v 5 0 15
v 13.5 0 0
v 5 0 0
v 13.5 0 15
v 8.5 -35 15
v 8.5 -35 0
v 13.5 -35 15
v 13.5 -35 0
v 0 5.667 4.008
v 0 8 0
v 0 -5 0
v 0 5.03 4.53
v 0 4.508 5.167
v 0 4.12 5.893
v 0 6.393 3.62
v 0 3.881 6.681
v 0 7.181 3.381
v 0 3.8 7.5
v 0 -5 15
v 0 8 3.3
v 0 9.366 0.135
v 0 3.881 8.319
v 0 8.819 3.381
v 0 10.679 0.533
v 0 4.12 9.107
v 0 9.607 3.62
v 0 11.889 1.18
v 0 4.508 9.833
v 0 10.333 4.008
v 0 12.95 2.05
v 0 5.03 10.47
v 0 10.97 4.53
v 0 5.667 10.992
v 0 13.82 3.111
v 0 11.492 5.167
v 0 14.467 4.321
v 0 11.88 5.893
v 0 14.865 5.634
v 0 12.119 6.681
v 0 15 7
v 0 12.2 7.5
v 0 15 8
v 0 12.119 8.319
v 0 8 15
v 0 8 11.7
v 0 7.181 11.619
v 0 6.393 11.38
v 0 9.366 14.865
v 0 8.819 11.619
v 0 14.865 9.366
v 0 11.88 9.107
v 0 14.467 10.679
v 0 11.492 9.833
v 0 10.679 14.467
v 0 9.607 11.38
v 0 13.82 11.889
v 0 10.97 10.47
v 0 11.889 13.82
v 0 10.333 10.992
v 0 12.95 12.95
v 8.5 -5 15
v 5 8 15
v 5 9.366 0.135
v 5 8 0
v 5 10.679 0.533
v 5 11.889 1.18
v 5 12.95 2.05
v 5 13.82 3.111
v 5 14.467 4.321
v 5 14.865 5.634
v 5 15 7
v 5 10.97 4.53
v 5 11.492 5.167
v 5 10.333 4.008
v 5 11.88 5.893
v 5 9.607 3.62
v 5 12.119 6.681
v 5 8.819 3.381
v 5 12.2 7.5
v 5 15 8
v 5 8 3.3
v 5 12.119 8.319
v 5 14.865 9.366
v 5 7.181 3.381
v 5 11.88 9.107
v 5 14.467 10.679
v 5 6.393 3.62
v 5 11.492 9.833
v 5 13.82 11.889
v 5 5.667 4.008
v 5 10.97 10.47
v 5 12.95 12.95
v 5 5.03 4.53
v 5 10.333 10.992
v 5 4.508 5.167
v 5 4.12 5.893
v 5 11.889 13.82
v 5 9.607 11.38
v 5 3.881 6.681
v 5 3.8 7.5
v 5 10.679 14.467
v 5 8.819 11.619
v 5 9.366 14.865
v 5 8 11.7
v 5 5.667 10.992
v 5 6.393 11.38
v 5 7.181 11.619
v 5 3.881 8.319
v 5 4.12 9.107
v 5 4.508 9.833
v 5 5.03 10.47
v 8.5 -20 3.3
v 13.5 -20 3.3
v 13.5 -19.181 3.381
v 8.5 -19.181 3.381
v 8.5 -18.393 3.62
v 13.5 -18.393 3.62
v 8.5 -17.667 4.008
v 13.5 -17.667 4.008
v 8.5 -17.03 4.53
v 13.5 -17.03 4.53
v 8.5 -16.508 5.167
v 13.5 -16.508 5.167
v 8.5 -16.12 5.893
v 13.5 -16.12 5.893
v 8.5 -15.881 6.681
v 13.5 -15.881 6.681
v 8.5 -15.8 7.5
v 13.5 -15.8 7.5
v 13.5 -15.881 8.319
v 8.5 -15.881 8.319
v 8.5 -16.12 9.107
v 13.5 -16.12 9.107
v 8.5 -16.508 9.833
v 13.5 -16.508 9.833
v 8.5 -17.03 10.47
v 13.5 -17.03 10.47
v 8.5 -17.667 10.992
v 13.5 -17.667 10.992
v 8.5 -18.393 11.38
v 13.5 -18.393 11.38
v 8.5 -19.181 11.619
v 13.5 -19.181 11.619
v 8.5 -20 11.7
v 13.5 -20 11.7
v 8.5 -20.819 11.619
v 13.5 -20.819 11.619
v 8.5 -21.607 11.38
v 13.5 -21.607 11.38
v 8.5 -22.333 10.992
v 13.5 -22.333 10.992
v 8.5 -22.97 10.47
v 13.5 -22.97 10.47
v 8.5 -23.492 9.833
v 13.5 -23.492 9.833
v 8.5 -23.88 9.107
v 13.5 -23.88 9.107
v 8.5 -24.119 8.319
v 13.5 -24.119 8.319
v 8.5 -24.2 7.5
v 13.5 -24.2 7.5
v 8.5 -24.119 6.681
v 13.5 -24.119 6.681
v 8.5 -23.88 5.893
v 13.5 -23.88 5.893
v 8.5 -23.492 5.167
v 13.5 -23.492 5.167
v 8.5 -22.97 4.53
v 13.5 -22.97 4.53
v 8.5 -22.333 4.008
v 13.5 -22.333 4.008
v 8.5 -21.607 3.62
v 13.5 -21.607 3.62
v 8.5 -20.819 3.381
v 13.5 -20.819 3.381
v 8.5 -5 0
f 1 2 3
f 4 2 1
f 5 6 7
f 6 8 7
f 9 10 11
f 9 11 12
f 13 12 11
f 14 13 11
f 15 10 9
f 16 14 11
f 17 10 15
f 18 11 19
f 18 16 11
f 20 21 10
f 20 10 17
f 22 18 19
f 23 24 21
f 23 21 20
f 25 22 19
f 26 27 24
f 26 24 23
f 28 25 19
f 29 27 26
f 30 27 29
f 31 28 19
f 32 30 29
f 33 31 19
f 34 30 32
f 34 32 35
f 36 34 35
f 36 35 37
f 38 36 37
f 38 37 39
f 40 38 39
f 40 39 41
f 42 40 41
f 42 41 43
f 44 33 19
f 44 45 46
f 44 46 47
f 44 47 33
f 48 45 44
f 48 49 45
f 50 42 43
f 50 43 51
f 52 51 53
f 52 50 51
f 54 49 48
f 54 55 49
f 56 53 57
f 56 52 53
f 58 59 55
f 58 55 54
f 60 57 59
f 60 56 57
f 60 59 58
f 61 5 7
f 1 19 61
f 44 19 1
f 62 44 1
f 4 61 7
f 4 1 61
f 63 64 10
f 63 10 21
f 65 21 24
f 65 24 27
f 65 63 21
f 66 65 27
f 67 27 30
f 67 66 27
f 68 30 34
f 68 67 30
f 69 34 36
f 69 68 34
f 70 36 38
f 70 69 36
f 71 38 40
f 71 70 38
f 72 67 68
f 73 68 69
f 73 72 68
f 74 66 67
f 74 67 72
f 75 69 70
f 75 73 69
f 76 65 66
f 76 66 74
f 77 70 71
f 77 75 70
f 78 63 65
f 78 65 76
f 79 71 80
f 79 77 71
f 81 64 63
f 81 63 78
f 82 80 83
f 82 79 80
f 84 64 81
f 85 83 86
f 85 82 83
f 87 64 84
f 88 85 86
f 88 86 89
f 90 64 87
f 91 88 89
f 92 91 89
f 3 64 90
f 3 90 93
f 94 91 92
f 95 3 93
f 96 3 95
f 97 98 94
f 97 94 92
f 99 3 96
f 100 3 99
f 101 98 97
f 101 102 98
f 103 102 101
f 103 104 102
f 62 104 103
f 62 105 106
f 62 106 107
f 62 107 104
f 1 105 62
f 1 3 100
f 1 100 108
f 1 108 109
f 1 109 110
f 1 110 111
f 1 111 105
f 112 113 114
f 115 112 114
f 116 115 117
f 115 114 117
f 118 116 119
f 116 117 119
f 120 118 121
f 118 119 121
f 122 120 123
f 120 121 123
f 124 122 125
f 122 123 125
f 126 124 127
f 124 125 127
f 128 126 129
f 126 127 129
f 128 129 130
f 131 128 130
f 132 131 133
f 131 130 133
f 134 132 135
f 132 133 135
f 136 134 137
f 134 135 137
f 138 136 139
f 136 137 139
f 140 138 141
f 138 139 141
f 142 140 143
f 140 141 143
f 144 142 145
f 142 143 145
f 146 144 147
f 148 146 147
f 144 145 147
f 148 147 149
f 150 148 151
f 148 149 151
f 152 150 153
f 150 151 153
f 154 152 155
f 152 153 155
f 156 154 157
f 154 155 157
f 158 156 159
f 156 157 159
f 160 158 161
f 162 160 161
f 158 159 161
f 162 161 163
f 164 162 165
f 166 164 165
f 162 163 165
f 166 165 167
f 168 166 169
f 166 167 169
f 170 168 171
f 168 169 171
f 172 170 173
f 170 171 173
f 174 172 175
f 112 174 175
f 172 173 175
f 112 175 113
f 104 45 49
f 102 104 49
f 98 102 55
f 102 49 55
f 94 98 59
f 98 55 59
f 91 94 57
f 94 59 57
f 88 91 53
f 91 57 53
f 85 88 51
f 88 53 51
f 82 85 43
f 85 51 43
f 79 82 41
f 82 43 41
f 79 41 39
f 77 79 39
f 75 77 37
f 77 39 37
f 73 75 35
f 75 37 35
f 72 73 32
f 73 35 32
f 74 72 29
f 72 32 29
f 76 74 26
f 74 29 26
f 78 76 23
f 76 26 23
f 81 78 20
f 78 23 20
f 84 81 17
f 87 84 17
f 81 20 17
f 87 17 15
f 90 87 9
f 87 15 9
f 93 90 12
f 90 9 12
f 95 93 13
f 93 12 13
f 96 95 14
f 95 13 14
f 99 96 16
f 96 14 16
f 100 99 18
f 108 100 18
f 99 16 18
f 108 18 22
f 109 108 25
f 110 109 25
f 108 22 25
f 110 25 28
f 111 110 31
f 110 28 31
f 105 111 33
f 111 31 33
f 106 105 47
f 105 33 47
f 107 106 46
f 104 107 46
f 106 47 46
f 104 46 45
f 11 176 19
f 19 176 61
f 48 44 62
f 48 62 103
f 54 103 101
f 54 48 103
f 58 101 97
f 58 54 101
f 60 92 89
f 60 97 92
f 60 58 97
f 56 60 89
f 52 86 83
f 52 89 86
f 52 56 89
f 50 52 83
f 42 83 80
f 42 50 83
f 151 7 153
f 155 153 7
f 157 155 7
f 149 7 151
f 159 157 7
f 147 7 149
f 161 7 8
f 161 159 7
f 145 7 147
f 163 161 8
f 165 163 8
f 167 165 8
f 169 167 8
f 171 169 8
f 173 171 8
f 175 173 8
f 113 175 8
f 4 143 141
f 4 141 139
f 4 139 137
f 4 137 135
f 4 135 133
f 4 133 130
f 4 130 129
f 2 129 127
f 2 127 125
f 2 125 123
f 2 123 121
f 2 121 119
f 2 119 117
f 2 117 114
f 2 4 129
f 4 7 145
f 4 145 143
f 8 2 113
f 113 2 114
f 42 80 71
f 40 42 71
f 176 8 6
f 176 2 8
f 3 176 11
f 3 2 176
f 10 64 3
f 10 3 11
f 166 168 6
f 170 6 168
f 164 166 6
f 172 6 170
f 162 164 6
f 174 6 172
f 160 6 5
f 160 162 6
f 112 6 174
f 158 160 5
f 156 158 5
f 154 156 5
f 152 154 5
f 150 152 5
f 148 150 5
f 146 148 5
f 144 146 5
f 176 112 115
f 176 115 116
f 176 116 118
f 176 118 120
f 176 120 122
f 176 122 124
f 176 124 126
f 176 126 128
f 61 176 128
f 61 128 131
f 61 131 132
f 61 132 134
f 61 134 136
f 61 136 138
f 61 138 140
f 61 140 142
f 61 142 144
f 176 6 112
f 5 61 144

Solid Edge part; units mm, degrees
sketch "Sketch1" plane through (0, 0, 0) normal (0, -1, 0) x (1, 0, 0)
  line L0 (13.5, 0) -> (0, 0)
  line L1 (0, 0) -> (0, 15)
  line L2 (0, 15) -> (13.5, 15)
  line L3 (13.5, 15) -> (13.5, 0)
extrude "Protrusion1" add sketch "Sketch1" along normal blind 5
sketch "Sketch2" plane through (18.75, -5, 7.5) normal (0, -1, 0) x (1, 0, 0)
  line L0 (-10.25, -7.5) -> (-10.25, 7.5)
  line L1 (-10.25, 7.5) -> (-5.25, 7.5)
  line L2 (-5.25, 7.5) -> (-5.25, -7.5)
  line L3 (-5.25, -7.5) -> (-10.25, -7.5)
extrude "ExtrudedProtrusion_2" add sketch "Sketch2" along normal blind 30
sketch "Sketch3" plane through (18.75, 0, 7.5) normal (0, 1, 0) x (-1, 0, 0)
  line L0 (13.75, -7.5) -> (13.75, 7.5)
  line L1 (13.75, 7.5) -> (18.75, 7.5)
  line L2 (18.75, 7.5) -> (18.75, -7.5)
  line L3 (18.75, -7.5) -> (13.75, -7.5)
extrude "ExtrudedProtrusion_3" add sketch "Sketch3" along normal blind 15
sketch "Sketch4" plane through (13.5, -17.5, 7.5) normal (1, 0, 0) x (0, 1, 0)
  circle A0 centre (-2.5, 0) radius 4
extrude "Cutout1" cut sketch "Sketch4" against normal through all
sketch "Sketch5" plane through (0, 5, 7.5) normal (-1, 0, 0) x (0, -1, 0)
  circle A0 centre (-3, 0) radius 4
extrude "Cutout2" cut sketch "Sketch5" against normal through all
fillet "Round1" radius 7 2 edges at (2.5, 15, 15) (2.5, 15, 0)
hole "Hole_1" at (0, 8, 7.5) direction (1, 0, 0) diameter 8.4 end up to next
hole "Hole_2" at (13.5, -20, 7.5) direction (-1, 0, 0) diameter 8.4 end up to next
